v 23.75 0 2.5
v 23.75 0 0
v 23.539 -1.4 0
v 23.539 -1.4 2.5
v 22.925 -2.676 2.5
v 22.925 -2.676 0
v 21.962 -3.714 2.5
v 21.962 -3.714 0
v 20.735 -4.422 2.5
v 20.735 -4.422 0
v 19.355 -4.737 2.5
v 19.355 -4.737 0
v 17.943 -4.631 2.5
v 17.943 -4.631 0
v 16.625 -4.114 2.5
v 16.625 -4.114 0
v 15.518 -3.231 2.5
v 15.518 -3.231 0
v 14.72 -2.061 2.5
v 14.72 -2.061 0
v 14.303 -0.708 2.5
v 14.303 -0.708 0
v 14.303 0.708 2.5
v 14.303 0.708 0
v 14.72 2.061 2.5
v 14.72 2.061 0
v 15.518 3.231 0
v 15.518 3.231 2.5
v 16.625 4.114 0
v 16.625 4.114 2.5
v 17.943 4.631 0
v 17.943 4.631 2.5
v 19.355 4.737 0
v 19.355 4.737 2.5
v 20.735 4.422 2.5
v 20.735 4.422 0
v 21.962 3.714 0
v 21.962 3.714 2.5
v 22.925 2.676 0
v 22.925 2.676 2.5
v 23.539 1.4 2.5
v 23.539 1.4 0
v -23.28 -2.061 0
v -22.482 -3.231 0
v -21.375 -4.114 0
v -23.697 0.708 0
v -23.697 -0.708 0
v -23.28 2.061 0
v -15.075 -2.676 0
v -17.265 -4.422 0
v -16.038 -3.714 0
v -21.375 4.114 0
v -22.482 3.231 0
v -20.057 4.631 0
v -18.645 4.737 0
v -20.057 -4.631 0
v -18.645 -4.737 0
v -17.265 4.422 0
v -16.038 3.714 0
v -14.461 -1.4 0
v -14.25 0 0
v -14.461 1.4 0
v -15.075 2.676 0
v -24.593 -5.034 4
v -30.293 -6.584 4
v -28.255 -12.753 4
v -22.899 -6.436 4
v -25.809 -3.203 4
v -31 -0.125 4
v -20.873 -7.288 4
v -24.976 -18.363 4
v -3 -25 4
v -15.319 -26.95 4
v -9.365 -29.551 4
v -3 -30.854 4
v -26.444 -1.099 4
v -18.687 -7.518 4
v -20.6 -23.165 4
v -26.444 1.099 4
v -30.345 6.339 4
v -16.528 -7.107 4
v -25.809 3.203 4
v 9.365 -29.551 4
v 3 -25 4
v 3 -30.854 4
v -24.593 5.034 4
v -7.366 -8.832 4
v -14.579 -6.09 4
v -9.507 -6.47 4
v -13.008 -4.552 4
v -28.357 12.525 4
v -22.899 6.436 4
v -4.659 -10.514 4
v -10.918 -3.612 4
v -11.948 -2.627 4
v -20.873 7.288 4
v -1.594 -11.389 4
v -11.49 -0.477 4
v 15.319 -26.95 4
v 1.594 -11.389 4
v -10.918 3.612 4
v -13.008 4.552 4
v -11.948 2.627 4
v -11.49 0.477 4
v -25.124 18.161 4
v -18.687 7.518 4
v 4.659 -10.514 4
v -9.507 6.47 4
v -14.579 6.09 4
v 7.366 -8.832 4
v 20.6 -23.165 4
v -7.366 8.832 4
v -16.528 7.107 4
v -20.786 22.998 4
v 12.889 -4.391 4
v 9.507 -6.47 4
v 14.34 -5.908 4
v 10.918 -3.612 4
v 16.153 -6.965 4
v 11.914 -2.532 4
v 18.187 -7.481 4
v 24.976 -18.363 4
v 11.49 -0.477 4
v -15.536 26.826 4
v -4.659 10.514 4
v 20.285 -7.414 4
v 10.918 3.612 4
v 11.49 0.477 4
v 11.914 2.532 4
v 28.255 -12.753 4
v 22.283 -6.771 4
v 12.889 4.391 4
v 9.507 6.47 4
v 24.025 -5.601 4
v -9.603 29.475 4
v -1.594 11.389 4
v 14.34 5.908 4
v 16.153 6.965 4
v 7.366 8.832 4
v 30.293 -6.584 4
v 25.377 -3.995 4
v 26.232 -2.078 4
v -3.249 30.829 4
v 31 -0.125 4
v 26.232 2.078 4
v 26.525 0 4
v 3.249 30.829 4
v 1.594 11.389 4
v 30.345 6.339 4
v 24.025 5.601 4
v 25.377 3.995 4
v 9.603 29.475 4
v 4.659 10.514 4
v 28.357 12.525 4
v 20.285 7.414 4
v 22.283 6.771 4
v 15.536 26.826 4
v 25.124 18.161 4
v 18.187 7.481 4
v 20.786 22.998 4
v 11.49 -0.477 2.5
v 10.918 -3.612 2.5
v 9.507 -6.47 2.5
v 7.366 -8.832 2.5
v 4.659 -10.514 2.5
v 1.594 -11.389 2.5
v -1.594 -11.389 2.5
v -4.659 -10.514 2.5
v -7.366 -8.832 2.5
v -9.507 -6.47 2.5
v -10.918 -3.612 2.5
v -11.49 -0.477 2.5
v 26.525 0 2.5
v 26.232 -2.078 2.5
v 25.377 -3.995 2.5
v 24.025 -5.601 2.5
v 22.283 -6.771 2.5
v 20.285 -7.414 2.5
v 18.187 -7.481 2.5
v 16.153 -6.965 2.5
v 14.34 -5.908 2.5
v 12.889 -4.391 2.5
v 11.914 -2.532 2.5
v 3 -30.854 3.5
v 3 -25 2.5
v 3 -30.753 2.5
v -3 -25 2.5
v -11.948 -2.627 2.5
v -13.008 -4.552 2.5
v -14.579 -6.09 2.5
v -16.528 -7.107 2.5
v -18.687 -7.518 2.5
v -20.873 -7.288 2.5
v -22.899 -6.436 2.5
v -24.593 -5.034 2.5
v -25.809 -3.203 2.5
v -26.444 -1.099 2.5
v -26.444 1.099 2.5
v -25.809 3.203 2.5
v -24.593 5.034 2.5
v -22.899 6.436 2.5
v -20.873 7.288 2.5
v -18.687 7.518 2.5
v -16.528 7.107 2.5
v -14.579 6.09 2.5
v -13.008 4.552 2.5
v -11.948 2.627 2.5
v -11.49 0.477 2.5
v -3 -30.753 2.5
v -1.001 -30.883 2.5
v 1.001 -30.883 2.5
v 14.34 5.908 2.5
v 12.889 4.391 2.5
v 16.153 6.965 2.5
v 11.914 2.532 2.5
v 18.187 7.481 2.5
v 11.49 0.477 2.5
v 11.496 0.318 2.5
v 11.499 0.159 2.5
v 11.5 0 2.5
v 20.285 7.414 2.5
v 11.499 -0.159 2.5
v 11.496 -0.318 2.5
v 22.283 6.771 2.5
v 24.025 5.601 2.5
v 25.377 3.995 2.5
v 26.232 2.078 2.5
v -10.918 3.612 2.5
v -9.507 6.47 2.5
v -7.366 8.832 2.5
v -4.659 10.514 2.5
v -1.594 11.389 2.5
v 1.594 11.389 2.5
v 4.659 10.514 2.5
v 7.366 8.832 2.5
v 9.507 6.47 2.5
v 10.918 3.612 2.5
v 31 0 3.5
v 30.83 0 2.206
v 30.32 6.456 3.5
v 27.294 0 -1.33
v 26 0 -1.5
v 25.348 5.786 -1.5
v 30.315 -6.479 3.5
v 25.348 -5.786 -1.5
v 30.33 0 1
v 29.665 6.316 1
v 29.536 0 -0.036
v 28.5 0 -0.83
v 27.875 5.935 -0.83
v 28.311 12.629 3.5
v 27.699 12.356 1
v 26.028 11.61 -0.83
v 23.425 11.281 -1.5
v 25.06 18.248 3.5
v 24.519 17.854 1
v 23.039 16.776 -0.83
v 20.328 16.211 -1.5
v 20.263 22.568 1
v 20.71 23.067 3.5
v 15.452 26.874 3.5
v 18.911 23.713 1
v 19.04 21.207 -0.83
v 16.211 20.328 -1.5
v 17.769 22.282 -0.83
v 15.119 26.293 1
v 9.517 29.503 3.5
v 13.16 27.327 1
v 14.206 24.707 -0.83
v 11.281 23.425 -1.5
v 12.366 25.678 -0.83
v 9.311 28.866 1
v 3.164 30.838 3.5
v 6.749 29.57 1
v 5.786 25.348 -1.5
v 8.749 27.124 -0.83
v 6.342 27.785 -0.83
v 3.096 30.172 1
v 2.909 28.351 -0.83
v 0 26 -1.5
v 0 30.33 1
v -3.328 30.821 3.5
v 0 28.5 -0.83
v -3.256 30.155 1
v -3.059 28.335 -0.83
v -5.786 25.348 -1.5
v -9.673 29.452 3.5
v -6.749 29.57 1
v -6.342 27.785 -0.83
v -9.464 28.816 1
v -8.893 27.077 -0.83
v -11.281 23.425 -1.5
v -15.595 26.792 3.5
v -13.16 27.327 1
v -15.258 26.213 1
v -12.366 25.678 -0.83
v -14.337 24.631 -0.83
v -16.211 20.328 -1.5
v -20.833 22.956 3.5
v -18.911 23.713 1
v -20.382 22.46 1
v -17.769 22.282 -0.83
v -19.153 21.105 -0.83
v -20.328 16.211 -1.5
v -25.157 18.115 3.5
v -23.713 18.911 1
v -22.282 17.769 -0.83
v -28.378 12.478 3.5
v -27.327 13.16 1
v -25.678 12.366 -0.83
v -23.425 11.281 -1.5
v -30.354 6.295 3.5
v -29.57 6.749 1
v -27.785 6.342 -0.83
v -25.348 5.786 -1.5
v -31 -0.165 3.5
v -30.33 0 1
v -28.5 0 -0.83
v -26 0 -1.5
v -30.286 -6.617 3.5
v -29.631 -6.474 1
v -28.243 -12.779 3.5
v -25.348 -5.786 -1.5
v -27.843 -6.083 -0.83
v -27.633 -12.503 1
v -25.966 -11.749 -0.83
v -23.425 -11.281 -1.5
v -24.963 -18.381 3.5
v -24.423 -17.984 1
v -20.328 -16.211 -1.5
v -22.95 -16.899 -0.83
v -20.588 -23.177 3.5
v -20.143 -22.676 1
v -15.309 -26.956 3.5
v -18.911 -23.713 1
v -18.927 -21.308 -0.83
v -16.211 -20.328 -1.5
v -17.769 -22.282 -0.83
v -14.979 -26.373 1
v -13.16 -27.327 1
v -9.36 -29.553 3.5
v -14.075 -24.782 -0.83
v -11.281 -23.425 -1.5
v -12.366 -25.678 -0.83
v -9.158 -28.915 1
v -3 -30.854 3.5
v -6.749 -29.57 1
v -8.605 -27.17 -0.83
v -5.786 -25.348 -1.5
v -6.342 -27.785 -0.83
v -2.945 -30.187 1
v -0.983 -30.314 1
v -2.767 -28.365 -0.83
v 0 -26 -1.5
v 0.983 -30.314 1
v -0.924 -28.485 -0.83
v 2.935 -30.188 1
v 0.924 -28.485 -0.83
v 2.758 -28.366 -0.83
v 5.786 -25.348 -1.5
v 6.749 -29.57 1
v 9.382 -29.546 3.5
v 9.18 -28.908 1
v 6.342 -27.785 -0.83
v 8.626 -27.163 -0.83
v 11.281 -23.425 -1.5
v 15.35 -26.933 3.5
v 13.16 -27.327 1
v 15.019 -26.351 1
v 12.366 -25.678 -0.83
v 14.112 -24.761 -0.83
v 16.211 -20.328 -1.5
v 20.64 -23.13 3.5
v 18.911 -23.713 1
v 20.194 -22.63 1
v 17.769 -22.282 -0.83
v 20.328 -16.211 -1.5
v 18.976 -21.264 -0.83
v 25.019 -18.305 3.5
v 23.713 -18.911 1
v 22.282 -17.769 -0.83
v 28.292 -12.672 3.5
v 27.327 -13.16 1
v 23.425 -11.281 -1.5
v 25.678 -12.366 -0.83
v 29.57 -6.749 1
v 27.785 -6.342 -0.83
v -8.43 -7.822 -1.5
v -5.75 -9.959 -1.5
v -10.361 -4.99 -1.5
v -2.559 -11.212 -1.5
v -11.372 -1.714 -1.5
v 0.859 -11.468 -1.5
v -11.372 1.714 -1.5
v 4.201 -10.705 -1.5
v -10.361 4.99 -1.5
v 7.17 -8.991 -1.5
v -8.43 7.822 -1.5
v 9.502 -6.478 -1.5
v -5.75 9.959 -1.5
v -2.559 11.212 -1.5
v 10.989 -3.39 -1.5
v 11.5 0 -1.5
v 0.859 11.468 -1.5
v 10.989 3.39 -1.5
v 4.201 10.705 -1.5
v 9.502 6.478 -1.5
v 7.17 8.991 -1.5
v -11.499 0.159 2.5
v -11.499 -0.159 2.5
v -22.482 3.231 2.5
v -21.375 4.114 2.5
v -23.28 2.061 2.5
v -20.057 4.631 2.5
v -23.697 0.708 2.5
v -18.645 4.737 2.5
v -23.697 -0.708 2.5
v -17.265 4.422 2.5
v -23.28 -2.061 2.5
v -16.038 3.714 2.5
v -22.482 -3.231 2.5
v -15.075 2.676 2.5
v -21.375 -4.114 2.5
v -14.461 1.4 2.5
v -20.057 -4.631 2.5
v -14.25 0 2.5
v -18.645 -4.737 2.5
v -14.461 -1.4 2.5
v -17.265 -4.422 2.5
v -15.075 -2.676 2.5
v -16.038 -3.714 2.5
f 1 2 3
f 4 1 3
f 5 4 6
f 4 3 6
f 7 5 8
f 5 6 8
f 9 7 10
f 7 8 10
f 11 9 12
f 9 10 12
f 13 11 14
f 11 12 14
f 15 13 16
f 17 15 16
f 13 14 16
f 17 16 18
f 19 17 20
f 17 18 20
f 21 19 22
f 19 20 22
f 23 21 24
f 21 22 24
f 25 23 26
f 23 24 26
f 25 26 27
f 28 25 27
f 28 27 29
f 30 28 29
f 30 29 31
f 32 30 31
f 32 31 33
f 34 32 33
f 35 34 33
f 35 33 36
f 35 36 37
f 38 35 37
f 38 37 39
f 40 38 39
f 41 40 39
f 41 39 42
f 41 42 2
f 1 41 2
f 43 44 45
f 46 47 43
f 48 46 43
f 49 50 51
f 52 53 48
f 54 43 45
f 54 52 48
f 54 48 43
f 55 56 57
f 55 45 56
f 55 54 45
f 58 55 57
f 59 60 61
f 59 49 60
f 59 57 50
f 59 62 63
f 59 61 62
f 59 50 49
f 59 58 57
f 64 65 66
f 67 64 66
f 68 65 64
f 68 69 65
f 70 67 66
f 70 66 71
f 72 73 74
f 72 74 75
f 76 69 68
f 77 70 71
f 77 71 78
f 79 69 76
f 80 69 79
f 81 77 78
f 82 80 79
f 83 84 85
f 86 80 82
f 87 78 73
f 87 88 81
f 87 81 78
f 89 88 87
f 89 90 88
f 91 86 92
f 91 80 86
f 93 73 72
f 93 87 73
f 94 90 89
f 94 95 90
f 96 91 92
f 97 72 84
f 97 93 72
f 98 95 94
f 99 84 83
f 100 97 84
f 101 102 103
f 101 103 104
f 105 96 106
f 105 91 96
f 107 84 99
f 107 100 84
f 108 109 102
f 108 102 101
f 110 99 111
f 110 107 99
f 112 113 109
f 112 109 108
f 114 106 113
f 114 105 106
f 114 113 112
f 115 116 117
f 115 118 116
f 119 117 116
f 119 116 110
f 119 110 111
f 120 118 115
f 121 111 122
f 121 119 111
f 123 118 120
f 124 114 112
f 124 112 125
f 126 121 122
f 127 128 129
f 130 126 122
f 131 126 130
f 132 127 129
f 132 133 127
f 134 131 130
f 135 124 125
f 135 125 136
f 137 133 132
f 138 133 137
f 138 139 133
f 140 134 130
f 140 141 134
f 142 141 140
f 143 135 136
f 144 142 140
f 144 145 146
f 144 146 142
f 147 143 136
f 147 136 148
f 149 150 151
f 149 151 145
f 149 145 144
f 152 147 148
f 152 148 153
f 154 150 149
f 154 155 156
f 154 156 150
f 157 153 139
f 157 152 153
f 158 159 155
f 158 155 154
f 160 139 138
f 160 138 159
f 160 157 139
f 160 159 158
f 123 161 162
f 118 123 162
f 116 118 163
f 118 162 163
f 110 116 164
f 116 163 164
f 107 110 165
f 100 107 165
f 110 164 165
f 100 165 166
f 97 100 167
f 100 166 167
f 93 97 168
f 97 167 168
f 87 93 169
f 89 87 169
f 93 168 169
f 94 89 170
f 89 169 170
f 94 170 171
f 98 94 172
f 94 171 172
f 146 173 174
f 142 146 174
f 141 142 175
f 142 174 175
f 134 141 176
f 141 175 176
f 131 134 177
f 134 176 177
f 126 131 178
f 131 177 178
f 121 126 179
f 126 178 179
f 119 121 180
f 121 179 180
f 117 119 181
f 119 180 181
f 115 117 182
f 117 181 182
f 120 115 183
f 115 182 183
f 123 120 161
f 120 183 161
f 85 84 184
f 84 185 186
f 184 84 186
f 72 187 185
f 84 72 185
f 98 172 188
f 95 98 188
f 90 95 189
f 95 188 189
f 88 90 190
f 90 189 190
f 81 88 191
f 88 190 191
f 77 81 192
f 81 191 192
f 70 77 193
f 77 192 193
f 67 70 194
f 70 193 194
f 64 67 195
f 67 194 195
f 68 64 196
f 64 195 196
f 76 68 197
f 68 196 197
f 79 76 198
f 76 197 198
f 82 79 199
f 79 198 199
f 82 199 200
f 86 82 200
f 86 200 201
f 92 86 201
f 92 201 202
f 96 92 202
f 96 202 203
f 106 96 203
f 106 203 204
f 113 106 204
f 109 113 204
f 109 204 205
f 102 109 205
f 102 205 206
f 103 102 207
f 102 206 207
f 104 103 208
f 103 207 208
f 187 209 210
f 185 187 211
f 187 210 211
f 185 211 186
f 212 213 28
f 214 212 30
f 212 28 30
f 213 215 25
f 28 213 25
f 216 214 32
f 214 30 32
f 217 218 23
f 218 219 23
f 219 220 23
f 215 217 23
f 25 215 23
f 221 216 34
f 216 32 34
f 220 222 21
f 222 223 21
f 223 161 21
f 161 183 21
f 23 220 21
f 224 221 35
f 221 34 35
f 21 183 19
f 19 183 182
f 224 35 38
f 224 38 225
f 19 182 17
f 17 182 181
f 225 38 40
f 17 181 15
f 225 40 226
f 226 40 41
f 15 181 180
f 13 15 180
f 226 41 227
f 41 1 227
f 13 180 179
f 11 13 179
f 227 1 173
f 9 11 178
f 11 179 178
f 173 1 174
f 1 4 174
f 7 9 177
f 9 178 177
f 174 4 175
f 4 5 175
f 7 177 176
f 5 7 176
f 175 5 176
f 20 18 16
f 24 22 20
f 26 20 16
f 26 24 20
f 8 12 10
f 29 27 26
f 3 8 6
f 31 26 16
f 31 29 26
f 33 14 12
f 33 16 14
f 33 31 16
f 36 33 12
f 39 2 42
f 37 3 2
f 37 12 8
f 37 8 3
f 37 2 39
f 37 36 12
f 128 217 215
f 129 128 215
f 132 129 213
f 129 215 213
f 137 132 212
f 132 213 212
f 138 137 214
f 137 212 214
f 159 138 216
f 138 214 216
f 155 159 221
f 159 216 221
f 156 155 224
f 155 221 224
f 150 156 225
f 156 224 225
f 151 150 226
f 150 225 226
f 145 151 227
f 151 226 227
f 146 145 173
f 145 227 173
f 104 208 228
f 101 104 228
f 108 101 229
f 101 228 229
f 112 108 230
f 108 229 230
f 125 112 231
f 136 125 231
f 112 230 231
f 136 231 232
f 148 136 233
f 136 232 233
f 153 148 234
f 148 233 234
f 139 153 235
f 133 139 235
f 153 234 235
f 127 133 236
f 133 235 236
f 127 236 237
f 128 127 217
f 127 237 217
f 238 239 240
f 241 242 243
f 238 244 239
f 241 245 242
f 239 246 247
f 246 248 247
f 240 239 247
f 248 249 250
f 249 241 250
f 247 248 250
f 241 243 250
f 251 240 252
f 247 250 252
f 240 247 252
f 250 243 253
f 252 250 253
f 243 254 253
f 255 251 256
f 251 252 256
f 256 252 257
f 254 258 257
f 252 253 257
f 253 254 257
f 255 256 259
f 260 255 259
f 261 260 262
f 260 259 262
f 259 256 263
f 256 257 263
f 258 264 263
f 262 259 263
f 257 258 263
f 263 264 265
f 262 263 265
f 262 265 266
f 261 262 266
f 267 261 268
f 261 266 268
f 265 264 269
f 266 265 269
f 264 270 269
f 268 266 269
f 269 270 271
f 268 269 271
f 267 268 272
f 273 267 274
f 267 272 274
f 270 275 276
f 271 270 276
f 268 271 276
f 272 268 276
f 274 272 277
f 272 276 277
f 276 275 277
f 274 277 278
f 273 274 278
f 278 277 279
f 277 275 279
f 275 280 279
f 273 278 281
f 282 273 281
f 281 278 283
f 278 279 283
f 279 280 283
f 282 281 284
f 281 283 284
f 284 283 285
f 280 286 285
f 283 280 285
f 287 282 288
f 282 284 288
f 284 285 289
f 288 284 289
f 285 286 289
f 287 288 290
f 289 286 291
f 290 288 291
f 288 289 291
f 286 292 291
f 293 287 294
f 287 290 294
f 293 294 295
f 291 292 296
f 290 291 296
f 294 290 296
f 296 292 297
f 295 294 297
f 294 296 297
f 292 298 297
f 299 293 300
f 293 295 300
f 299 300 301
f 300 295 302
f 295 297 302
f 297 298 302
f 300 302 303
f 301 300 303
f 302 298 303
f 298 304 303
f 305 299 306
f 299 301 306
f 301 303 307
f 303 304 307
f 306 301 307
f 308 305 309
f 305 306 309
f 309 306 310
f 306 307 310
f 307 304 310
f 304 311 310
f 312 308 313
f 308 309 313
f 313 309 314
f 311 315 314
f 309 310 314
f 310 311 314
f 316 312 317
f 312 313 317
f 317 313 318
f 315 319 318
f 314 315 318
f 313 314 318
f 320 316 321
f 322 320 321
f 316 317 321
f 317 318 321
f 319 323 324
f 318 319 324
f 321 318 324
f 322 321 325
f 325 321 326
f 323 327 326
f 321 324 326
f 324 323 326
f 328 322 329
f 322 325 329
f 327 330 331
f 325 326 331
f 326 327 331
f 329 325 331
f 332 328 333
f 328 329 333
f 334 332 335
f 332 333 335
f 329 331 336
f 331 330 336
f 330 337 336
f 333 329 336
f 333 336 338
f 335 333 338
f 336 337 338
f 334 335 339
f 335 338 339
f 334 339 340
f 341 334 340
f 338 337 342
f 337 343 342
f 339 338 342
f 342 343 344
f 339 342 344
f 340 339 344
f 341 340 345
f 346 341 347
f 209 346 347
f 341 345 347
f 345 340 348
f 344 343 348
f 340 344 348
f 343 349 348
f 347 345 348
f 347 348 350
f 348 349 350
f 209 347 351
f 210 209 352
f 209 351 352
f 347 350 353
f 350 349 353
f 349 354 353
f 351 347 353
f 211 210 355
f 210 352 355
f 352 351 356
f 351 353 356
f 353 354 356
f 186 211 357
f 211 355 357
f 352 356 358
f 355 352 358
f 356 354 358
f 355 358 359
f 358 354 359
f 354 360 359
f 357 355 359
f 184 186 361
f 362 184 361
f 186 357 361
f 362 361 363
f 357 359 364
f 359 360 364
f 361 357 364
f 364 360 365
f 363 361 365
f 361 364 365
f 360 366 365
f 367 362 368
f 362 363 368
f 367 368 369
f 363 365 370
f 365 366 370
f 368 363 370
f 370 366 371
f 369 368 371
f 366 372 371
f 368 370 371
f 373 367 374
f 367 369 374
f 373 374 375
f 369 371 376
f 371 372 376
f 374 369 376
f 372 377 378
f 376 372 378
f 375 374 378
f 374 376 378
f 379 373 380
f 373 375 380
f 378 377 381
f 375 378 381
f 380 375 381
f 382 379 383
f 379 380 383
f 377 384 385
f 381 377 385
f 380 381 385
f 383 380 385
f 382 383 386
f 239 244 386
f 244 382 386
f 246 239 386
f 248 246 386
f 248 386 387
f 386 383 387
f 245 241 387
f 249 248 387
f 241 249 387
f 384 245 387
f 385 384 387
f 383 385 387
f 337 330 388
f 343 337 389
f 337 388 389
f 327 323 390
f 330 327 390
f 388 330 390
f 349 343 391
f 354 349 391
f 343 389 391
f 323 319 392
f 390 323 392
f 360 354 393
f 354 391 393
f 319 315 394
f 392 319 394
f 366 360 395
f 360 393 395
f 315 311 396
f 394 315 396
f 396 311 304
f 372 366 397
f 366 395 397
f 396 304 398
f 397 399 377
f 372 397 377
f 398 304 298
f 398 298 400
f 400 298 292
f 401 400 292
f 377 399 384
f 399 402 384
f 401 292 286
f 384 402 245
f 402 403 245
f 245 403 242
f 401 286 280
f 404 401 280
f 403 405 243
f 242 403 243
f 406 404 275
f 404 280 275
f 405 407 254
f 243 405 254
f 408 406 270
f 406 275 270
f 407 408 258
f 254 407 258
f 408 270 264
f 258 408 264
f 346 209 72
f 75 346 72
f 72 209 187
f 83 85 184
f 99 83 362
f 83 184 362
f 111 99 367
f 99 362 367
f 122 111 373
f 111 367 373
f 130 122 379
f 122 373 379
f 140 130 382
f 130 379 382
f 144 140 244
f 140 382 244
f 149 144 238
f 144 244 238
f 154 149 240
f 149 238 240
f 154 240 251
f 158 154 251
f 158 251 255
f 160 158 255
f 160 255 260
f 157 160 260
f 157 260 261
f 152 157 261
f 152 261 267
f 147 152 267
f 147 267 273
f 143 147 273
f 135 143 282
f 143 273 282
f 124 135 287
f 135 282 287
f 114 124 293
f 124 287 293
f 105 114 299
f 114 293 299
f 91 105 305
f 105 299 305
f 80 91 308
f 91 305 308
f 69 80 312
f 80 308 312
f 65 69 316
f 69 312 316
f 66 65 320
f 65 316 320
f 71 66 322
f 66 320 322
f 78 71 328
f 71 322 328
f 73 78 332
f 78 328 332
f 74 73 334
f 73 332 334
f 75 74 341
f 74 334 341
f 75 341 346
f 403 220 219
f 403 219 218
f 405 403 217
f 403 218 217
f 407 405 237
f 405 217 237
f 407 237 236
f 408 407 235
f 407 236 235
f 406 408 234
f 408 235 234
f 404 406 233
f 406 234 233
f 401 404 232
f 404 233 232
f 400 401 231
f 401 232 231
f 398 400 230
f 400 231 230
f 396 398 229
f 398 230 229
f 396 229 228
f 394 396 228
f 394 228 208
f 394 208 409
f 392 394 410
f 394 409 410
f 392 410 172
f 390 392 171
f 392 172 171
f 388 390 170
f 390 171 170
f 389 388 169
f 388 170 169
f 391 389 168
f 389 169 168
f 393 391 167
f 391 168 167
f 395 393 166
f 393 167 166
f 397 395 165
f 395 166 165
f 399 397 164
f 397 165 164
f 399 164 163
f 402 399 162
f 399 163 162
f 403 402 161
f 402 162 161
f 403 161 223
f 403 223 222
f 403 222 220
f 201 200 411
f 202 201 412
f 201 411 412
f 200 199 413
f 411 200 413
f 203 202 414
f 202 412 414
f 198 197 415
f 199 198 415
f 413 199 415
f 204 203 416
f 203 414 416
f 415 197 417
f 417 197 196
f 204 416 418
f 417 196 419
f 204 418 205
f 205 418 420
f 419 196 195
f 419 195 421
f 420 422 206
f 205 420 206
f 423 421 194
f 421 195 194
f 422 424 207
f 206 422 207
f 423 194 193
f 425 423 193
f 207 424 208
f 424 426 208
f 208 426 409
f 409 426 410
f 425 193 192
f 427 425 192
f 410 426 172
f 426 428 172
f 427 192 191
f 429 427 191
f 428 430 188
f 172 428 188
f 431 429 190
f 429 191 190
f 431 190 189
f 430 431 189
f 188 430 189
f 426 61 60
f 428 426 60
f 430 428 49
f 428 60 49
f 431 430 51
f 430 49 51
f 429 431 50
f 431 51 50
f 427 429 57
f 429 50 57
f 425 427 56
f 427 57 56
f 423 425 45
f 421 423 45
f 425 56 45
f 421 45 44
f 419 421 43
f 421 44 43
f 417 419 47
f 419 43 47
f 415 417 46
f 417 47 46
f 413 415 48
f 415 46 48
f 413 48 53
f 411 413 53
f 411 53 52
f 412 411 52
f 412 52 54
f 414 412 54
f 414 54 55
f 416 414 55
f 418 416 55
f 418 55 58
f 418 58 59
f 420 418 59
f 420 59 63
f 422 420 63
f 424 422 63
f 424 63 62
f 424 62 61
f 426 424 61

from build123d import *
from build123d import SkipClean  # not in build123d's __all__

# Parameters (mm, degrees)
F0_R     = 31
F0_R_2   = 11.5
F1_DEPTH = 1.5
F2_R     = 31
F2_R_2   = 4.75
F2_R_3   = 11.5
F3_DEPTH = 4
F5_DEPTH = 1.5


# Not quite as in the source:
# - a fillet or chamfer that OpenCascade refuses, or shapes differently, is made with other operations: its cross-section is extruded or revolved along the edge and cut away or added


with BuildPart() as f1:
    # F0 (on Top) → F1 (new body)
    with BuildSketch(Plane.XY):
        Circle(F0_R)
        Circle(F0_R_2, mode=Mode.SUBTRACT)
    extrude(amount=-F1_DEPTH)

    # F2 (on face) → F3 (join)
    with BuildSketch(Plane(origin=(0, 0, -1.5), x_dir=(1, 0, 0), z_dir=(0, 0, -1))):
        Circle(F2_R)
        with Locations((-19, 0)):
            Circle(F2_R_2, mode=Mode.SUBTRACT)
        Circle(F2_R_3, mode=Mode.SUBTRACT)
        with Locations((19, 0)):
            Circle(F2_R_2, mode=Mode.SUBTRACT)
    extrude(amount=-F3_DEPTH)

    # F4 (on face) → F5 (join)
    with BuildSketch(Plane.XY.offset(2.5)):
        with BuildLine():
            ThreePointArc((3, -30.8544972411), (22.9564805665, -20.832666656), (31, 0))
            ThreePointArc((31, 0), (-20.832666656, 22.9564805665), (-3, -30.8544972411))
            Line((-3, -30.8544972411), (-3, -25))
            Line((-3, -25), (3, -25))
            Line((3, -25), (3, -30.8544972411))
        make_face()
        with BuildLine():
            ThreePointArc((-11.4901151316, 0.4767119288), (0, 11.5), (11.4901151316, 0.4767119288))
            ThreePointArc((11.4901151316, 0.4767119288), (19.2384757484, 7.5212202678), (26.525, 0))
            ThreePointArc((26.525, 0), (19.2384757484, -7.5212202678), (11.4901151316, -0.4767119288))
            ThreePointArc((11.4901151316, -0.4767119288), (0, -11.5), (-11.4901151316, -0.4767119288))
            ThreePointArc((-11.4901151316, -0.4767119288), (-26.525, 0), (-11.4901151316, 0.4767119288))
        make_face(mode=Mode.SUBTRACT)
    with SkipClean():  # cleaning this boolean's faces spoils the solid; the shape is the same uncleaned
        extrude(amount=F5_DEPTH)

    # F6: fillet of radius 5 on 1 edges, made by hand

    # F6_s1 → F6_t2 (revolve, cut)
    with BuildSketch(Plane.XZ):
        with BuildLine():
            ThreePointArc((31, 3.5), (29.5355339059, -0.0355339059), (26, -1.5))
            Line((26, -1.5), (31, -1.5))
            Line((31, -1.5), (31, 3.5))
        make_face()
    revolve(axis=Axis((0, 0, -1.5), (0, 0, 1)), mode=Mode.SUBTRACT)


solid = f1.part
